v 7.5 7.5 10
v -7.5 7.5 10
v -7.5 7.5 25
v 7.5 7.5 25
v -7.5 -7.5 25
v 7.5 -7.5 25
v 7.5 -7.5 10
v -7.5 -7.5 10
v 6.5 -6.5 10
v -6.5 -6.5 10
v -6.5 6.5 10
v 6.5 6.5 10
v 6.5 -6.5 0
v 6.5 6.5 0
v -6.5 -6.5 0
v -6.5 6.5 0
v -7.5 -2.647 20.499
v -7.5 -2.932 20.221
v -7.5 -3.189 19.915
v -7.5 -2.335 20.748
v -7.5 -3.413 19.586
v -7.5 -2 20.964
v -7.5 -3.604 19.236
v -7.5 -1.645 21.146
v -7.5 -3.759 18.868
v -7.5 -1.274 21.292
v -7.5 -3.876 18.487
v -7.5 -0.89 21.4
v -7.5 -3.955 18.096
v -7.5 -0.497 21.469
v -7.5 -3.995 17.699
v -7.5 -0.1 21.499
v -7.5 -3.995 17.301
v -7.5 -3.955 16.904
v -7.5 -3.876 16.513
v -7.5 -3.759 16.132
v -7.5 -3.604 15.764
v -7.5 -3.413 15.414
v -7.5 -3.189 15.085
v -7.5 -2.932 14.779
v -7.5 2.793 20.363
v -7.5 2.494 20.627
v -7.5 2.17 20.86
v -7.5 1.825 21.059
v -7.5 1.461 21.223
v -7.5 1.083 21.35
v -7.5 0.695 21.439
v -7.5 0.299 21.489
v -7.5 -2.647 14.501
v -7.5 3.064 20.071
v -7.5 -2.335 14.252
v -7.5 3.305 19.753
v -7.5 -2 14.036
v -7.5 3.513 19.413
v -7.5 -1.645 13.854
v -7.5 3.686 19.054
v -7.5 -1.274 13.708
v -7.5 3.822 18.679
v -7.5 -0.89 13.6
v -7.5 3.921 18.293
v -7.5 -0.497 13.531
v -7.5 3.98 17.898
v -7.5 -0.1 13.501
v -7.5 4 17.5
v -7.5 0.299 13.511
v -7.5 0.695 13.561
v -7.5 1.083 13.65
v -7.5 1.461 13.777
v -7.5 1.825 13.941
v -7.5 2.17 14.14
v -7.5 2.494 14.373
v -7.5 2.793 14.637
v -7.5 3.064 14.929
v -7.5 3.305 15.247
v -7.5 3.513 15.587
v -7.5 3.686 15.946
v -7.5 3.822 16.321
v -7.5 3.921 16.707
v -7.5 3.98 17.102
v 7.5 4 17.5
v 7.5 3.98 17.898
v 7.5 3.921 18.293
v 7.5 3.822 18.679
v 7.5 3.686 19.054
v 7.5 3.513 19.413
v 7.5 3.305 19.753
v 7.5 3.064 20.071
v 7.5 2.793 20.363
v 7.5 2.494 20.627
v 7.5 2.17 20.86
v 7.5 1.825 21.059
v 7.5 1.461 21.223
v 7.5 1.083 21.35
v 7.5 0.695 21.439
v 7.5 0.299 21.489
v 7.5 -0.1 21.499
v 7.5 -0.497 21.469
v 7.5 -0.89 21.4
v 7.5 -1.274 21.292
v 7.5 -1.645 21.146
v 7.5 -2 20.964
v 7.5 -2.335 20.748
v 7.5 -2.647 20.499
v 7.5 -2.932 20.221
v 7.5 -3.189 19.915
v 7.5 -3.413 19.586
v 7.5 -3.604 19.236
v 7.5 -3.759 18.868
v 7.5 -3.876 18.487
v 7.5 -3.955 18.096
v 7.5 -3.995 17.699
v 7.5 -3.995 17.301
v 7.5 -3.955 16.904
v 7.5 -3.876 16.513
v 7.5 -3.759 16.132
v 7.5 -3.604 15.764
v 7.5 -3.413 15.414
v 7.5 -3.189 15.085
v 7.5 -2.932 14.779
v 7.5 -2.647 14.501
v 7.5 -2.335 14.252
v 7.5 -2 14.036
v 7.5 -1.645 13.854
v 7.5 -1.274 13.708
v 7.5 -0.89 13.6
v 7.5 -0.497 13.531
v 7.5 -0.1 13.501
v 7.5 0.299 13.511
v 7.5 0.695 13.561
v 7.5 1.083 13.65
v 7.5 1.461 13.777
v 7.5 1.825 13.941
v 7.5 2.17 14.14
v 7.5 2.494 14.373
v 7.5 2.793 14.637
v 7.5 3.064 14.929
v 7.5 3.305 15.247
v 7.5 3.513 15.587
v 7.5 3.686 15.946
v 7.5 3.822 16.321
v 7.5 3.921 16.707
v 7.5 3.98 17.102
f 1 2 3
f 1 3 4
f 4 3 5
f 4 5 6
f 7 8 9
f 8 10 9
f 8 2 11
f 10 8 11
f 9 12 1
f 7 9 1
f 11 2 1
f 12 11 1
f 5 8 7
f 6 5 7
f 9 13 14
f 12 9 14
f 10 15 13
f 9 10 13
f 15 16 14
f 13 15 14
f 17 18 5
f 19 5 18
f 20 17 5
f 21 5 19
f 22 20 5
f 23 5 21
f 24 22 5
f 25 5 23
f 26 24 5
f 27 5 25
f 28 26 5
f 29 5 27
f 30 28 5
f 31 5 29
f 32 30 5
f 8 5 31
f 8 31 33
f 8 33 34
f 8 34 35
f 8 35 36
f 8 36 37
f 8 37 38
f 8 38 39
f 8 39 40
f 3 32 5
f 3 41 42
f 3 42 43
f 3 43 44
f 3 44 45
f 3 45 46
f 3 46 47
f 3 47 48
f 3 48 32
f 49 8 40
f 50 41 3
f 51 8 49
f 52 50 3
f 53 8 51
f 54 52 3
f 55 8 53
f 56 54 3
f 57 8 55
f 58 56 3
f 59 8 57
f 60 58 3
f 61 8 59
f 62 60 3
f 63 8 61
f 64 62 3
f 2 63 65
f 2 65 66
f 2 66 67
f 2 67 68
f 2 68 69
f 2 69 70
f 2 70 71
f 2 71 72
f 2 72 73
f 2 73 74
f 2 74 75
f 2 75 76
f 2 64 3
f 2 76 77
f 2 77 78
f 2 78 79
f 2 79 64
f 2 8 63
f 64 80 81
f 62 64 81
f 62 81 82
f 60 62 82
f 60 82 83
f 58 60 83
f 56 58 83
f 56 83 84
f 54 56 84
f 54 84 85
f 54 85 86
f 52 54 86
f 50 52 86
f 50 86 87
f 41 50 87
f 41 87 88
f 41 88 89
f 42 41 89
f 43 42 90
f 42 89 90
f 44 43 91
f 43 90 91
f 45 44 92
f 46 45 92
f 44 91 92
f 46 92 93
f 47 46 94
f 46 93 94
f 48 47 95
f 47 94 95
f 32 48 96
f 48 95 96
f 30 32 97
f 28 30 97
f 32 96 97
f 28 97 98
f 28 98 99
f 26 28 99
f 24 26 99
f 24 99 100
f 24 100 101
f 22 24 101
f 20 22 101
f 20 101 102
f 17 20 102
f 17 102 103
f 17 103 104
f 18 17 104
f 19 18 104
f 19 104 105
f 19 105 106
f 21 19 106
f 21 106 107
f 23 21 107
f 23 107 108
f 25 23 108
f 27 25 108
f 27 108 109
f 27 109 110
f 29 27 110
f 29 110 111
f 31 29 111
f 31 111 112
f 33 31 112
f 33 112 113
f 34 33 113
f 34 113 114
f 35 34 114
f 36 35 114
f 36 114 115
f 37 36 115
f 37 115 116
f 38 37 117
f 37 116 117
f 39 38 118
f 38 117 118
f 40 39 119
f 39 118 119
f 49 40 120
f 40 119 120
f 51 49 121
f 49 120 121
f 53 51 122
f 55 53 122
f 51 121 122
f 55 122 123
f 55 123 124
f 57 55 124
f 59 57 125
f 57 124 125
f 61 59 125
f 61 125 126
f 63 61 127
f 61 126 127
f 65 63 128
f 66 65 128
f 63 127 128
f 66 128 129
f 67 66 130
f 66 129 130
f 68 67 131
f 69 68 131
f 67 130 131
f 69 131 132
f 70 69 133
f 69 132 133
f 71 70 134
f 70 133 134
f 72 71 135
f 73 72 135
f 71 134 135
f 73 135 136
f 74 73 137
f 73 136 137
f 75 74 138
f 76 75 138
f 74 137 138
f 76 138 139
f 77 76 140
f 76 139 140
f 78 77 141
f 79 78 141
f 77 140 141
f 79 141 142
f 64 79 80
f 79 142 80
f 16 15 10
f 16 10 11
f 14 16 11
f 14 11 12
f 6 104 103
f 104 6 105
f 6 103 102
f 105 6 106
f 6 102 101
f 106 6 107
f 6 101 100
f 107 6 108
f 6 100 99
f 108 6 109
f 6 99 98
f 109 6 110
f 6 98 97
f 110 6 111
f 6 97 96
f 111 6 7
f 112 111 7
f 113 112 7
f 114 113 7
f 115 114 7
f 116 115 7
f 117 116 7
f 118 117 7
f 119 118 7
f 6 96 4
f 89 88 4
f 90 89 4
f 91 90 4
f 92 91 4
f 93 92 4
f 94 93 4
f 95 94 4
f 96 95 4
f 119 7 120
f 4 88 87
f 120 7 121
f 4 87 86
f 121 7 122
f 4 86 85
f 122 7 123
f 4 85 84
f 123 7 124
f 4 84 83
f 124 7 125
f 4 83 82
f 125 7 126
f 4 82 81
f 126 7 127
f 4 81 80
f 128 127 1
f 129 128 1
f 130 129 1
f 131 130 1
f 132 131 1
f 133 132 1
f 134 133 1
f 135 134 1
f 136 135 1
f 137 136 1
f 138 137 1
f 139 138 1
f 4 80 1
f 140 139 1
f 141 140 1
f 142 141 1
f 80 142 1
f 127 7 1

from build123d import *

# Parameters (mm, degrees)
F0_W     = 13
F0_H     = 13
F1_DEPTH = 10
F2_W     = 15
F2_H     = 15
F2_W_2   = 13
F2_H_2   = 13
F3_DEPTH = 15
F4_R     = 4
F5_DEPTH = 25


with BuildPart() as f1:
    # F0 (on Top) → F1 (new body)
    with BuildSketch(Plane.XY):
        Rectangle(F0_W, F0_H)
    extrude(amount=F1_DEPTH)

    # F2 (on face) → F3 (join)
    with BuildSketch(Plane.XY.offset(10)):
        Rectangle(F2_W, F2_H)
        Rectangle(F2_W_2, F2_H_2, mode=Mode.SUBTRACT)
        Rectangle(F2_W_2, F2_H_2)
    extrude(amount=F3_DEPTH)

    # F4 (on face) → F5 (cut)
    with BuildSketch(Plane.YZ.offset(7.5)):
        with Locations((0, 17.5)):
            Circle(F4_R)
    extrude(amount=-F5_DEPTH, mode=Mode.SUBTRACT)


solid = f1.part
